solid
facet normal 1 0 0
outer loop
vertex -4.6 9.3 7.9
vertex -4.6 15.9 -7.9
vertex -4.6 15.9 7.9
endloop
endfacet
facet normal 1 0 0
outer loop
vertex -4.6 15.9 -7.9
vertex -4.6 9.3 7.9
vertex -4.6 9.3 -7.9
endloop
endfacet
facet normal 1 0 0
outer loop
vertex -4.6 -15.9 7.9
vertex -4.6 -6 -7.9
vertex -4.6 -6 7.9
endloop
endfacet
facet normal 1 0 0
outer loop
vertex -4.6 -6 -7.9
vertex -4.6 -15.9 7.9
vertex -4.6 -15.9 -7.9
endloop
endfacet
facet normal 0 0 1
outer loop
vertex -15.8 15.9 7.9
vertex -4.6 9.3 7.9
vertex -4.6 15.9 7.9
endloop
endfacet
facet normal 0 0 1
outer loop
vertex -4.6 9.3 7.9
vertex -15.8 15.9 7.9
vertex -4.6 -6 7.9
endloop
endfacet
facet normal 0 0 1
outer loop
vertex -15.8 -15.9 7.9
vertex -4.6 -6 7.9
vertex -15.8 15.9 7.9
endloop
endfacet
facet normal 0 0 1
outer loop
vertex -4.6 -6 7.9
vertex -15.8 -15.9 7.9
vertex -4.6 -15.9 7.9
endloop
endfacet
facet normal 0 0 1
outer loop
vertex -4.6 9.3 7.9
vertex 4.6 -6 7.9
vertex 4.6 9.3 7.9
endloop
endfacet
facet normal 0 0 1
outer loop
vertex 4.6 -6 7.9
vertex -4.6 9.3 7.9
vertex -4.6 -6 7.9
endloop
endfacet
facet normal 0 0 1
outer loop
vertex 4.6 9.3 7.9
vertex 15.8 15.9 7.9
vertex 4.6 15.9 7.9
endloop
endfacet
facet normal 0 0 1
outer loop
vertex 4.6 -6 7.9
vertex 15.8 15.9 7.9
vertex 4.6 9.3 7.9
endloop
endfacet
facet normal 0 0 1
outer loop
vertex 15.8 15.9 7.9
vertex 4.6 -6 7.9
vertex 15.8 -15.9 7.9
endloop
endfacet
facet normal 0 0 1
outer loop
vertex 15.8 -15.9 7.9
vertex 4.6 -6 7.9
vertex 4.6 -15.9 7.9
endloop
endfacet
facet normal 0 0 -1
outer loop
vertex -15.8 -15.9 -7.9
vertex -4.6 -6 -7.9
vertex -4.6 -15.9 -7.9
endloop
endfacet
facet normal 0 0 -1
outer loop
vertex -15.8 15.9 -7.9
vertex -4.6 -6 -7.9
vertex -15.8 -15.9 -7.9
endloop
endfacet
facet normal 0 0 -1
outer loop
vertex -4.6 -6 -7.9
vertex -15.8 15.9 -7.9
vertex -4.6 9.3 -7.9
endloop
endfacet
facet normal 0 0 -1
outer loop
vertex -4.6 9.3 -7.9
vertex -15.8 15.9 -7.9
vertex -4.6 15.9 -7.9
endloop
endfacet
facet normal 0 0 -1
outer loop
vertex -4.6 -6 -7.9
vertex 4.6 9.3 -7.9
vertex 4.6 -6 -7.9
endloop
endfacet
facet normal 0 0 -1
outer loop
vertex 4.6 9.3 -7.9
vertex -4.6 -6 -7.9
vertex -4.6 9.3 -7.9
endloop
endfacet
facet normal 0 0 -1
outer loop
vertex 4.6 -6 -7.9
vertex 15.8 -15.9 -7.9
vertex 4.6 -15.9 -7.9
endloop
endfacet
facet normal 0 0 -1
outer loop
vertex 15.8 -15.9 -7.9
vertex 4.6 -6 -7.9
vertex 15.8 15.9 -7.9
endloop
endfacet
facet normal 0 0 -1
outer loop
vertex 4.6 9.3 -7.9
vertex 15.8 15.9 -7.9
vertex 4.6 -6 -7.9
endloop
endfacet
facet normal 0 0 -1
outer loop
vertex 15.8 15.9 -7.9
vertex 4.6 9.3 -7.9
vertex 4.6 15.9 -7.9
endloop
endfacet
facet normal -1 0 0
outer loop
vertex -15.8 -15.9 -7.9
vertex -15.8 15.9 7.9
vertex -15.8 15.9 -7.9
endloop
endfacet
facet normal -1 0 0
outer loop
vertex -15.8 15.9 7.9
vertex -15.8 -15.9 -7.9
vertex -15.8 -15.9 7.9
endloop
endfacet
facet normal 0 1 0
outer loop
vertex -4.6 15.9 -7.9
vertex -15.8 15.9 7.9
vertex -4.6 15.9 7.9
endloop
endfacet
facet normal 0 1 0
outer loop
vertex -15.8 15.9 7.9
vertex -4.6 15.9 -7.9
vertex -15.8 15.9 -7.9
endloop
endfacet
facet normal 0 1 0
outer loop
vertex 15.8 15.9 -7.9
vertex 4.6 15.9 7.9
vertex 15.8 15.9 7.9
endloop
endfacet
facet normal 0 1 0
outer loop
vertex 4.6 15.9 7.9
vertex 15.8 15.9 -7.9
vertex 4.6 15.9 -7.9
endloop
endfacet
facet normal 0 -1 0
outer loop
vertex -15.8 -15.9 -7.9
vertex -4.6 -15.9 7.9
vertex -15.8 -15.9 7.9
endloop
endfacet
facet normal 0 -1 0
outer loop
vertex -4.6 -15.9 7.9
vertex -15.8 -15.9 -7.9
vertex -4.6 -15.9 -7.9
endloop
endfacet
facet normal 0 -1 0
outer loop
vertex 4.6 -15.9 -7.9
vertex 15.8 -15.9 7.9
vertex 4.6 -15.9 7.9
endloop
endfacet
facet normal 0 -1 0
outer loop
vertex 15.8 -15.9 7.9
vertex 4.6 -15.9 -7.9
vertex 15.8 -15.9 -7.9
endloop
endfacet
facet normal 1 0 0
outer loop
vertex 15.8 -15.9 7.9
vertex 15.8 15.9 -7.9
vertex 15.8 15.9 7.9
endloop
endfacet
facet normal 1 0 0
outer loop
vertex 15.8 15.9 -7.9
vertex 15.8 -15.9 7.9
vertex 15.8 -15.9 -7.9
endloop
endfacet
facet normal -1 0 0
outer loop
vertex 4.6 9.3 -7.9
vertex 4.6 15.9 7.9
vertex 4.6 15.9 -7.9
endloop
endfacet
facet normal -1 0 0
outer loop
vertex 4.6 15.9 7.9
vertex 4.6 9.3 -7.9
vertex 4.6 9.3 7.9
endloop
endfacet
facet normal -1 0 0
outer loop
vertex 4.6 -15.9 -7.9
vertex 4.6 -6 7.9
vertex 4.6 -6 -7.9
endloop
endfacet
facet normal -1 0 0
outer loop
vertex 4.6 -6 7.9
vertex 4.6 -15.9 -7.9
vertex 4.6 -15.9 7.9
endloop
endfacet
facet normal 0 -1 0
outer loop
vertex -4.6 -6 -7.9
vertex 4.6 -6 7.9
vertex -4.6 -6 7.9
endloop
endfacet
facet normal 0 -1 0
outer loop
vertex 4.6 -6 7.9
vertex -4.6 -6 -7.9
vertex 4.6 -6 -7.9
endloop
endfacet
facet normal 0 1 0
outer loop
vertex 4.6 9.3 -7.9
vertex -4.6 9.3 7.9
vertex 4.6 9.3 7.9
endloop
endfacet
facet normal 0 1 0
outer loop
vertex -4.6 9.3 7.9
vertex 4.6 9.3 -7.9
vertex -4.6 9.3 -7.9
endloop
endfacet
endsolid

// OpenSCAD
$fn=64;

L = 31.8;
W = 31.8;
H = 15.8;

module end_block(xc, len, wid, hgt){
    translate([xc,0,0]) cube([len,wid,hgt], center=true);
}

module bridge(len, wid, hgt){
    cube([len,wid,hgt], center=true);
}

module pad(xc, yc, zc, len, wid, hgt){
    translate([xc,yc,zc]) cube([len,wid,hgt], center=true);
}

module base_shape(){
    union(){
        end_block(-10.2, 11.2, 31.8, 15.8);
        end_block( 10.2, 11.2, 31.8, 15.8);
        bridge(10.4, 12.0, 15.8);
    }
}

module stepped_profile(){
    union(){
        base_shape();

        // Top rebates/steps (add material to create shoulders)
        pad(-10.2,  0.0,  5.0, 11.2, 20.0, 5.8);
        pad( 10.2,  0.0,  4.2, 11.2, 16.0, 7.4);
        pad(  0.0,  0.0,  4.6, 10.4, 10.0, 6.6);

        // Bottom rebates/steps (add material to create shoulders)
        pad(-10.2,  0.0, -5.2, 11.2, 14.0, 5.4);
        pad( 10.2,  0.0, -4.6, 11.2, 22.0, 6.6);
        pad(  0.0,  0.0, -4.8, 10.4,  8.0, 6.2);

        // Asymmetric offset pads to create non-mirrored profile
        pad(-10.2,  9.2,  0.0, 11.2,  6.0, 15.8);
        pad( 10.2, -8.6,  0.0, 11.2,  7.2, 15.8);
        pad(  0.0,  6.8,  0.0, 10.4,  5.0, 15.8);
    }
}

module final_part(){
    intersection(){
        stepped_profile();
        cube([L,W,H], center=true);
    }
}

final_part();
